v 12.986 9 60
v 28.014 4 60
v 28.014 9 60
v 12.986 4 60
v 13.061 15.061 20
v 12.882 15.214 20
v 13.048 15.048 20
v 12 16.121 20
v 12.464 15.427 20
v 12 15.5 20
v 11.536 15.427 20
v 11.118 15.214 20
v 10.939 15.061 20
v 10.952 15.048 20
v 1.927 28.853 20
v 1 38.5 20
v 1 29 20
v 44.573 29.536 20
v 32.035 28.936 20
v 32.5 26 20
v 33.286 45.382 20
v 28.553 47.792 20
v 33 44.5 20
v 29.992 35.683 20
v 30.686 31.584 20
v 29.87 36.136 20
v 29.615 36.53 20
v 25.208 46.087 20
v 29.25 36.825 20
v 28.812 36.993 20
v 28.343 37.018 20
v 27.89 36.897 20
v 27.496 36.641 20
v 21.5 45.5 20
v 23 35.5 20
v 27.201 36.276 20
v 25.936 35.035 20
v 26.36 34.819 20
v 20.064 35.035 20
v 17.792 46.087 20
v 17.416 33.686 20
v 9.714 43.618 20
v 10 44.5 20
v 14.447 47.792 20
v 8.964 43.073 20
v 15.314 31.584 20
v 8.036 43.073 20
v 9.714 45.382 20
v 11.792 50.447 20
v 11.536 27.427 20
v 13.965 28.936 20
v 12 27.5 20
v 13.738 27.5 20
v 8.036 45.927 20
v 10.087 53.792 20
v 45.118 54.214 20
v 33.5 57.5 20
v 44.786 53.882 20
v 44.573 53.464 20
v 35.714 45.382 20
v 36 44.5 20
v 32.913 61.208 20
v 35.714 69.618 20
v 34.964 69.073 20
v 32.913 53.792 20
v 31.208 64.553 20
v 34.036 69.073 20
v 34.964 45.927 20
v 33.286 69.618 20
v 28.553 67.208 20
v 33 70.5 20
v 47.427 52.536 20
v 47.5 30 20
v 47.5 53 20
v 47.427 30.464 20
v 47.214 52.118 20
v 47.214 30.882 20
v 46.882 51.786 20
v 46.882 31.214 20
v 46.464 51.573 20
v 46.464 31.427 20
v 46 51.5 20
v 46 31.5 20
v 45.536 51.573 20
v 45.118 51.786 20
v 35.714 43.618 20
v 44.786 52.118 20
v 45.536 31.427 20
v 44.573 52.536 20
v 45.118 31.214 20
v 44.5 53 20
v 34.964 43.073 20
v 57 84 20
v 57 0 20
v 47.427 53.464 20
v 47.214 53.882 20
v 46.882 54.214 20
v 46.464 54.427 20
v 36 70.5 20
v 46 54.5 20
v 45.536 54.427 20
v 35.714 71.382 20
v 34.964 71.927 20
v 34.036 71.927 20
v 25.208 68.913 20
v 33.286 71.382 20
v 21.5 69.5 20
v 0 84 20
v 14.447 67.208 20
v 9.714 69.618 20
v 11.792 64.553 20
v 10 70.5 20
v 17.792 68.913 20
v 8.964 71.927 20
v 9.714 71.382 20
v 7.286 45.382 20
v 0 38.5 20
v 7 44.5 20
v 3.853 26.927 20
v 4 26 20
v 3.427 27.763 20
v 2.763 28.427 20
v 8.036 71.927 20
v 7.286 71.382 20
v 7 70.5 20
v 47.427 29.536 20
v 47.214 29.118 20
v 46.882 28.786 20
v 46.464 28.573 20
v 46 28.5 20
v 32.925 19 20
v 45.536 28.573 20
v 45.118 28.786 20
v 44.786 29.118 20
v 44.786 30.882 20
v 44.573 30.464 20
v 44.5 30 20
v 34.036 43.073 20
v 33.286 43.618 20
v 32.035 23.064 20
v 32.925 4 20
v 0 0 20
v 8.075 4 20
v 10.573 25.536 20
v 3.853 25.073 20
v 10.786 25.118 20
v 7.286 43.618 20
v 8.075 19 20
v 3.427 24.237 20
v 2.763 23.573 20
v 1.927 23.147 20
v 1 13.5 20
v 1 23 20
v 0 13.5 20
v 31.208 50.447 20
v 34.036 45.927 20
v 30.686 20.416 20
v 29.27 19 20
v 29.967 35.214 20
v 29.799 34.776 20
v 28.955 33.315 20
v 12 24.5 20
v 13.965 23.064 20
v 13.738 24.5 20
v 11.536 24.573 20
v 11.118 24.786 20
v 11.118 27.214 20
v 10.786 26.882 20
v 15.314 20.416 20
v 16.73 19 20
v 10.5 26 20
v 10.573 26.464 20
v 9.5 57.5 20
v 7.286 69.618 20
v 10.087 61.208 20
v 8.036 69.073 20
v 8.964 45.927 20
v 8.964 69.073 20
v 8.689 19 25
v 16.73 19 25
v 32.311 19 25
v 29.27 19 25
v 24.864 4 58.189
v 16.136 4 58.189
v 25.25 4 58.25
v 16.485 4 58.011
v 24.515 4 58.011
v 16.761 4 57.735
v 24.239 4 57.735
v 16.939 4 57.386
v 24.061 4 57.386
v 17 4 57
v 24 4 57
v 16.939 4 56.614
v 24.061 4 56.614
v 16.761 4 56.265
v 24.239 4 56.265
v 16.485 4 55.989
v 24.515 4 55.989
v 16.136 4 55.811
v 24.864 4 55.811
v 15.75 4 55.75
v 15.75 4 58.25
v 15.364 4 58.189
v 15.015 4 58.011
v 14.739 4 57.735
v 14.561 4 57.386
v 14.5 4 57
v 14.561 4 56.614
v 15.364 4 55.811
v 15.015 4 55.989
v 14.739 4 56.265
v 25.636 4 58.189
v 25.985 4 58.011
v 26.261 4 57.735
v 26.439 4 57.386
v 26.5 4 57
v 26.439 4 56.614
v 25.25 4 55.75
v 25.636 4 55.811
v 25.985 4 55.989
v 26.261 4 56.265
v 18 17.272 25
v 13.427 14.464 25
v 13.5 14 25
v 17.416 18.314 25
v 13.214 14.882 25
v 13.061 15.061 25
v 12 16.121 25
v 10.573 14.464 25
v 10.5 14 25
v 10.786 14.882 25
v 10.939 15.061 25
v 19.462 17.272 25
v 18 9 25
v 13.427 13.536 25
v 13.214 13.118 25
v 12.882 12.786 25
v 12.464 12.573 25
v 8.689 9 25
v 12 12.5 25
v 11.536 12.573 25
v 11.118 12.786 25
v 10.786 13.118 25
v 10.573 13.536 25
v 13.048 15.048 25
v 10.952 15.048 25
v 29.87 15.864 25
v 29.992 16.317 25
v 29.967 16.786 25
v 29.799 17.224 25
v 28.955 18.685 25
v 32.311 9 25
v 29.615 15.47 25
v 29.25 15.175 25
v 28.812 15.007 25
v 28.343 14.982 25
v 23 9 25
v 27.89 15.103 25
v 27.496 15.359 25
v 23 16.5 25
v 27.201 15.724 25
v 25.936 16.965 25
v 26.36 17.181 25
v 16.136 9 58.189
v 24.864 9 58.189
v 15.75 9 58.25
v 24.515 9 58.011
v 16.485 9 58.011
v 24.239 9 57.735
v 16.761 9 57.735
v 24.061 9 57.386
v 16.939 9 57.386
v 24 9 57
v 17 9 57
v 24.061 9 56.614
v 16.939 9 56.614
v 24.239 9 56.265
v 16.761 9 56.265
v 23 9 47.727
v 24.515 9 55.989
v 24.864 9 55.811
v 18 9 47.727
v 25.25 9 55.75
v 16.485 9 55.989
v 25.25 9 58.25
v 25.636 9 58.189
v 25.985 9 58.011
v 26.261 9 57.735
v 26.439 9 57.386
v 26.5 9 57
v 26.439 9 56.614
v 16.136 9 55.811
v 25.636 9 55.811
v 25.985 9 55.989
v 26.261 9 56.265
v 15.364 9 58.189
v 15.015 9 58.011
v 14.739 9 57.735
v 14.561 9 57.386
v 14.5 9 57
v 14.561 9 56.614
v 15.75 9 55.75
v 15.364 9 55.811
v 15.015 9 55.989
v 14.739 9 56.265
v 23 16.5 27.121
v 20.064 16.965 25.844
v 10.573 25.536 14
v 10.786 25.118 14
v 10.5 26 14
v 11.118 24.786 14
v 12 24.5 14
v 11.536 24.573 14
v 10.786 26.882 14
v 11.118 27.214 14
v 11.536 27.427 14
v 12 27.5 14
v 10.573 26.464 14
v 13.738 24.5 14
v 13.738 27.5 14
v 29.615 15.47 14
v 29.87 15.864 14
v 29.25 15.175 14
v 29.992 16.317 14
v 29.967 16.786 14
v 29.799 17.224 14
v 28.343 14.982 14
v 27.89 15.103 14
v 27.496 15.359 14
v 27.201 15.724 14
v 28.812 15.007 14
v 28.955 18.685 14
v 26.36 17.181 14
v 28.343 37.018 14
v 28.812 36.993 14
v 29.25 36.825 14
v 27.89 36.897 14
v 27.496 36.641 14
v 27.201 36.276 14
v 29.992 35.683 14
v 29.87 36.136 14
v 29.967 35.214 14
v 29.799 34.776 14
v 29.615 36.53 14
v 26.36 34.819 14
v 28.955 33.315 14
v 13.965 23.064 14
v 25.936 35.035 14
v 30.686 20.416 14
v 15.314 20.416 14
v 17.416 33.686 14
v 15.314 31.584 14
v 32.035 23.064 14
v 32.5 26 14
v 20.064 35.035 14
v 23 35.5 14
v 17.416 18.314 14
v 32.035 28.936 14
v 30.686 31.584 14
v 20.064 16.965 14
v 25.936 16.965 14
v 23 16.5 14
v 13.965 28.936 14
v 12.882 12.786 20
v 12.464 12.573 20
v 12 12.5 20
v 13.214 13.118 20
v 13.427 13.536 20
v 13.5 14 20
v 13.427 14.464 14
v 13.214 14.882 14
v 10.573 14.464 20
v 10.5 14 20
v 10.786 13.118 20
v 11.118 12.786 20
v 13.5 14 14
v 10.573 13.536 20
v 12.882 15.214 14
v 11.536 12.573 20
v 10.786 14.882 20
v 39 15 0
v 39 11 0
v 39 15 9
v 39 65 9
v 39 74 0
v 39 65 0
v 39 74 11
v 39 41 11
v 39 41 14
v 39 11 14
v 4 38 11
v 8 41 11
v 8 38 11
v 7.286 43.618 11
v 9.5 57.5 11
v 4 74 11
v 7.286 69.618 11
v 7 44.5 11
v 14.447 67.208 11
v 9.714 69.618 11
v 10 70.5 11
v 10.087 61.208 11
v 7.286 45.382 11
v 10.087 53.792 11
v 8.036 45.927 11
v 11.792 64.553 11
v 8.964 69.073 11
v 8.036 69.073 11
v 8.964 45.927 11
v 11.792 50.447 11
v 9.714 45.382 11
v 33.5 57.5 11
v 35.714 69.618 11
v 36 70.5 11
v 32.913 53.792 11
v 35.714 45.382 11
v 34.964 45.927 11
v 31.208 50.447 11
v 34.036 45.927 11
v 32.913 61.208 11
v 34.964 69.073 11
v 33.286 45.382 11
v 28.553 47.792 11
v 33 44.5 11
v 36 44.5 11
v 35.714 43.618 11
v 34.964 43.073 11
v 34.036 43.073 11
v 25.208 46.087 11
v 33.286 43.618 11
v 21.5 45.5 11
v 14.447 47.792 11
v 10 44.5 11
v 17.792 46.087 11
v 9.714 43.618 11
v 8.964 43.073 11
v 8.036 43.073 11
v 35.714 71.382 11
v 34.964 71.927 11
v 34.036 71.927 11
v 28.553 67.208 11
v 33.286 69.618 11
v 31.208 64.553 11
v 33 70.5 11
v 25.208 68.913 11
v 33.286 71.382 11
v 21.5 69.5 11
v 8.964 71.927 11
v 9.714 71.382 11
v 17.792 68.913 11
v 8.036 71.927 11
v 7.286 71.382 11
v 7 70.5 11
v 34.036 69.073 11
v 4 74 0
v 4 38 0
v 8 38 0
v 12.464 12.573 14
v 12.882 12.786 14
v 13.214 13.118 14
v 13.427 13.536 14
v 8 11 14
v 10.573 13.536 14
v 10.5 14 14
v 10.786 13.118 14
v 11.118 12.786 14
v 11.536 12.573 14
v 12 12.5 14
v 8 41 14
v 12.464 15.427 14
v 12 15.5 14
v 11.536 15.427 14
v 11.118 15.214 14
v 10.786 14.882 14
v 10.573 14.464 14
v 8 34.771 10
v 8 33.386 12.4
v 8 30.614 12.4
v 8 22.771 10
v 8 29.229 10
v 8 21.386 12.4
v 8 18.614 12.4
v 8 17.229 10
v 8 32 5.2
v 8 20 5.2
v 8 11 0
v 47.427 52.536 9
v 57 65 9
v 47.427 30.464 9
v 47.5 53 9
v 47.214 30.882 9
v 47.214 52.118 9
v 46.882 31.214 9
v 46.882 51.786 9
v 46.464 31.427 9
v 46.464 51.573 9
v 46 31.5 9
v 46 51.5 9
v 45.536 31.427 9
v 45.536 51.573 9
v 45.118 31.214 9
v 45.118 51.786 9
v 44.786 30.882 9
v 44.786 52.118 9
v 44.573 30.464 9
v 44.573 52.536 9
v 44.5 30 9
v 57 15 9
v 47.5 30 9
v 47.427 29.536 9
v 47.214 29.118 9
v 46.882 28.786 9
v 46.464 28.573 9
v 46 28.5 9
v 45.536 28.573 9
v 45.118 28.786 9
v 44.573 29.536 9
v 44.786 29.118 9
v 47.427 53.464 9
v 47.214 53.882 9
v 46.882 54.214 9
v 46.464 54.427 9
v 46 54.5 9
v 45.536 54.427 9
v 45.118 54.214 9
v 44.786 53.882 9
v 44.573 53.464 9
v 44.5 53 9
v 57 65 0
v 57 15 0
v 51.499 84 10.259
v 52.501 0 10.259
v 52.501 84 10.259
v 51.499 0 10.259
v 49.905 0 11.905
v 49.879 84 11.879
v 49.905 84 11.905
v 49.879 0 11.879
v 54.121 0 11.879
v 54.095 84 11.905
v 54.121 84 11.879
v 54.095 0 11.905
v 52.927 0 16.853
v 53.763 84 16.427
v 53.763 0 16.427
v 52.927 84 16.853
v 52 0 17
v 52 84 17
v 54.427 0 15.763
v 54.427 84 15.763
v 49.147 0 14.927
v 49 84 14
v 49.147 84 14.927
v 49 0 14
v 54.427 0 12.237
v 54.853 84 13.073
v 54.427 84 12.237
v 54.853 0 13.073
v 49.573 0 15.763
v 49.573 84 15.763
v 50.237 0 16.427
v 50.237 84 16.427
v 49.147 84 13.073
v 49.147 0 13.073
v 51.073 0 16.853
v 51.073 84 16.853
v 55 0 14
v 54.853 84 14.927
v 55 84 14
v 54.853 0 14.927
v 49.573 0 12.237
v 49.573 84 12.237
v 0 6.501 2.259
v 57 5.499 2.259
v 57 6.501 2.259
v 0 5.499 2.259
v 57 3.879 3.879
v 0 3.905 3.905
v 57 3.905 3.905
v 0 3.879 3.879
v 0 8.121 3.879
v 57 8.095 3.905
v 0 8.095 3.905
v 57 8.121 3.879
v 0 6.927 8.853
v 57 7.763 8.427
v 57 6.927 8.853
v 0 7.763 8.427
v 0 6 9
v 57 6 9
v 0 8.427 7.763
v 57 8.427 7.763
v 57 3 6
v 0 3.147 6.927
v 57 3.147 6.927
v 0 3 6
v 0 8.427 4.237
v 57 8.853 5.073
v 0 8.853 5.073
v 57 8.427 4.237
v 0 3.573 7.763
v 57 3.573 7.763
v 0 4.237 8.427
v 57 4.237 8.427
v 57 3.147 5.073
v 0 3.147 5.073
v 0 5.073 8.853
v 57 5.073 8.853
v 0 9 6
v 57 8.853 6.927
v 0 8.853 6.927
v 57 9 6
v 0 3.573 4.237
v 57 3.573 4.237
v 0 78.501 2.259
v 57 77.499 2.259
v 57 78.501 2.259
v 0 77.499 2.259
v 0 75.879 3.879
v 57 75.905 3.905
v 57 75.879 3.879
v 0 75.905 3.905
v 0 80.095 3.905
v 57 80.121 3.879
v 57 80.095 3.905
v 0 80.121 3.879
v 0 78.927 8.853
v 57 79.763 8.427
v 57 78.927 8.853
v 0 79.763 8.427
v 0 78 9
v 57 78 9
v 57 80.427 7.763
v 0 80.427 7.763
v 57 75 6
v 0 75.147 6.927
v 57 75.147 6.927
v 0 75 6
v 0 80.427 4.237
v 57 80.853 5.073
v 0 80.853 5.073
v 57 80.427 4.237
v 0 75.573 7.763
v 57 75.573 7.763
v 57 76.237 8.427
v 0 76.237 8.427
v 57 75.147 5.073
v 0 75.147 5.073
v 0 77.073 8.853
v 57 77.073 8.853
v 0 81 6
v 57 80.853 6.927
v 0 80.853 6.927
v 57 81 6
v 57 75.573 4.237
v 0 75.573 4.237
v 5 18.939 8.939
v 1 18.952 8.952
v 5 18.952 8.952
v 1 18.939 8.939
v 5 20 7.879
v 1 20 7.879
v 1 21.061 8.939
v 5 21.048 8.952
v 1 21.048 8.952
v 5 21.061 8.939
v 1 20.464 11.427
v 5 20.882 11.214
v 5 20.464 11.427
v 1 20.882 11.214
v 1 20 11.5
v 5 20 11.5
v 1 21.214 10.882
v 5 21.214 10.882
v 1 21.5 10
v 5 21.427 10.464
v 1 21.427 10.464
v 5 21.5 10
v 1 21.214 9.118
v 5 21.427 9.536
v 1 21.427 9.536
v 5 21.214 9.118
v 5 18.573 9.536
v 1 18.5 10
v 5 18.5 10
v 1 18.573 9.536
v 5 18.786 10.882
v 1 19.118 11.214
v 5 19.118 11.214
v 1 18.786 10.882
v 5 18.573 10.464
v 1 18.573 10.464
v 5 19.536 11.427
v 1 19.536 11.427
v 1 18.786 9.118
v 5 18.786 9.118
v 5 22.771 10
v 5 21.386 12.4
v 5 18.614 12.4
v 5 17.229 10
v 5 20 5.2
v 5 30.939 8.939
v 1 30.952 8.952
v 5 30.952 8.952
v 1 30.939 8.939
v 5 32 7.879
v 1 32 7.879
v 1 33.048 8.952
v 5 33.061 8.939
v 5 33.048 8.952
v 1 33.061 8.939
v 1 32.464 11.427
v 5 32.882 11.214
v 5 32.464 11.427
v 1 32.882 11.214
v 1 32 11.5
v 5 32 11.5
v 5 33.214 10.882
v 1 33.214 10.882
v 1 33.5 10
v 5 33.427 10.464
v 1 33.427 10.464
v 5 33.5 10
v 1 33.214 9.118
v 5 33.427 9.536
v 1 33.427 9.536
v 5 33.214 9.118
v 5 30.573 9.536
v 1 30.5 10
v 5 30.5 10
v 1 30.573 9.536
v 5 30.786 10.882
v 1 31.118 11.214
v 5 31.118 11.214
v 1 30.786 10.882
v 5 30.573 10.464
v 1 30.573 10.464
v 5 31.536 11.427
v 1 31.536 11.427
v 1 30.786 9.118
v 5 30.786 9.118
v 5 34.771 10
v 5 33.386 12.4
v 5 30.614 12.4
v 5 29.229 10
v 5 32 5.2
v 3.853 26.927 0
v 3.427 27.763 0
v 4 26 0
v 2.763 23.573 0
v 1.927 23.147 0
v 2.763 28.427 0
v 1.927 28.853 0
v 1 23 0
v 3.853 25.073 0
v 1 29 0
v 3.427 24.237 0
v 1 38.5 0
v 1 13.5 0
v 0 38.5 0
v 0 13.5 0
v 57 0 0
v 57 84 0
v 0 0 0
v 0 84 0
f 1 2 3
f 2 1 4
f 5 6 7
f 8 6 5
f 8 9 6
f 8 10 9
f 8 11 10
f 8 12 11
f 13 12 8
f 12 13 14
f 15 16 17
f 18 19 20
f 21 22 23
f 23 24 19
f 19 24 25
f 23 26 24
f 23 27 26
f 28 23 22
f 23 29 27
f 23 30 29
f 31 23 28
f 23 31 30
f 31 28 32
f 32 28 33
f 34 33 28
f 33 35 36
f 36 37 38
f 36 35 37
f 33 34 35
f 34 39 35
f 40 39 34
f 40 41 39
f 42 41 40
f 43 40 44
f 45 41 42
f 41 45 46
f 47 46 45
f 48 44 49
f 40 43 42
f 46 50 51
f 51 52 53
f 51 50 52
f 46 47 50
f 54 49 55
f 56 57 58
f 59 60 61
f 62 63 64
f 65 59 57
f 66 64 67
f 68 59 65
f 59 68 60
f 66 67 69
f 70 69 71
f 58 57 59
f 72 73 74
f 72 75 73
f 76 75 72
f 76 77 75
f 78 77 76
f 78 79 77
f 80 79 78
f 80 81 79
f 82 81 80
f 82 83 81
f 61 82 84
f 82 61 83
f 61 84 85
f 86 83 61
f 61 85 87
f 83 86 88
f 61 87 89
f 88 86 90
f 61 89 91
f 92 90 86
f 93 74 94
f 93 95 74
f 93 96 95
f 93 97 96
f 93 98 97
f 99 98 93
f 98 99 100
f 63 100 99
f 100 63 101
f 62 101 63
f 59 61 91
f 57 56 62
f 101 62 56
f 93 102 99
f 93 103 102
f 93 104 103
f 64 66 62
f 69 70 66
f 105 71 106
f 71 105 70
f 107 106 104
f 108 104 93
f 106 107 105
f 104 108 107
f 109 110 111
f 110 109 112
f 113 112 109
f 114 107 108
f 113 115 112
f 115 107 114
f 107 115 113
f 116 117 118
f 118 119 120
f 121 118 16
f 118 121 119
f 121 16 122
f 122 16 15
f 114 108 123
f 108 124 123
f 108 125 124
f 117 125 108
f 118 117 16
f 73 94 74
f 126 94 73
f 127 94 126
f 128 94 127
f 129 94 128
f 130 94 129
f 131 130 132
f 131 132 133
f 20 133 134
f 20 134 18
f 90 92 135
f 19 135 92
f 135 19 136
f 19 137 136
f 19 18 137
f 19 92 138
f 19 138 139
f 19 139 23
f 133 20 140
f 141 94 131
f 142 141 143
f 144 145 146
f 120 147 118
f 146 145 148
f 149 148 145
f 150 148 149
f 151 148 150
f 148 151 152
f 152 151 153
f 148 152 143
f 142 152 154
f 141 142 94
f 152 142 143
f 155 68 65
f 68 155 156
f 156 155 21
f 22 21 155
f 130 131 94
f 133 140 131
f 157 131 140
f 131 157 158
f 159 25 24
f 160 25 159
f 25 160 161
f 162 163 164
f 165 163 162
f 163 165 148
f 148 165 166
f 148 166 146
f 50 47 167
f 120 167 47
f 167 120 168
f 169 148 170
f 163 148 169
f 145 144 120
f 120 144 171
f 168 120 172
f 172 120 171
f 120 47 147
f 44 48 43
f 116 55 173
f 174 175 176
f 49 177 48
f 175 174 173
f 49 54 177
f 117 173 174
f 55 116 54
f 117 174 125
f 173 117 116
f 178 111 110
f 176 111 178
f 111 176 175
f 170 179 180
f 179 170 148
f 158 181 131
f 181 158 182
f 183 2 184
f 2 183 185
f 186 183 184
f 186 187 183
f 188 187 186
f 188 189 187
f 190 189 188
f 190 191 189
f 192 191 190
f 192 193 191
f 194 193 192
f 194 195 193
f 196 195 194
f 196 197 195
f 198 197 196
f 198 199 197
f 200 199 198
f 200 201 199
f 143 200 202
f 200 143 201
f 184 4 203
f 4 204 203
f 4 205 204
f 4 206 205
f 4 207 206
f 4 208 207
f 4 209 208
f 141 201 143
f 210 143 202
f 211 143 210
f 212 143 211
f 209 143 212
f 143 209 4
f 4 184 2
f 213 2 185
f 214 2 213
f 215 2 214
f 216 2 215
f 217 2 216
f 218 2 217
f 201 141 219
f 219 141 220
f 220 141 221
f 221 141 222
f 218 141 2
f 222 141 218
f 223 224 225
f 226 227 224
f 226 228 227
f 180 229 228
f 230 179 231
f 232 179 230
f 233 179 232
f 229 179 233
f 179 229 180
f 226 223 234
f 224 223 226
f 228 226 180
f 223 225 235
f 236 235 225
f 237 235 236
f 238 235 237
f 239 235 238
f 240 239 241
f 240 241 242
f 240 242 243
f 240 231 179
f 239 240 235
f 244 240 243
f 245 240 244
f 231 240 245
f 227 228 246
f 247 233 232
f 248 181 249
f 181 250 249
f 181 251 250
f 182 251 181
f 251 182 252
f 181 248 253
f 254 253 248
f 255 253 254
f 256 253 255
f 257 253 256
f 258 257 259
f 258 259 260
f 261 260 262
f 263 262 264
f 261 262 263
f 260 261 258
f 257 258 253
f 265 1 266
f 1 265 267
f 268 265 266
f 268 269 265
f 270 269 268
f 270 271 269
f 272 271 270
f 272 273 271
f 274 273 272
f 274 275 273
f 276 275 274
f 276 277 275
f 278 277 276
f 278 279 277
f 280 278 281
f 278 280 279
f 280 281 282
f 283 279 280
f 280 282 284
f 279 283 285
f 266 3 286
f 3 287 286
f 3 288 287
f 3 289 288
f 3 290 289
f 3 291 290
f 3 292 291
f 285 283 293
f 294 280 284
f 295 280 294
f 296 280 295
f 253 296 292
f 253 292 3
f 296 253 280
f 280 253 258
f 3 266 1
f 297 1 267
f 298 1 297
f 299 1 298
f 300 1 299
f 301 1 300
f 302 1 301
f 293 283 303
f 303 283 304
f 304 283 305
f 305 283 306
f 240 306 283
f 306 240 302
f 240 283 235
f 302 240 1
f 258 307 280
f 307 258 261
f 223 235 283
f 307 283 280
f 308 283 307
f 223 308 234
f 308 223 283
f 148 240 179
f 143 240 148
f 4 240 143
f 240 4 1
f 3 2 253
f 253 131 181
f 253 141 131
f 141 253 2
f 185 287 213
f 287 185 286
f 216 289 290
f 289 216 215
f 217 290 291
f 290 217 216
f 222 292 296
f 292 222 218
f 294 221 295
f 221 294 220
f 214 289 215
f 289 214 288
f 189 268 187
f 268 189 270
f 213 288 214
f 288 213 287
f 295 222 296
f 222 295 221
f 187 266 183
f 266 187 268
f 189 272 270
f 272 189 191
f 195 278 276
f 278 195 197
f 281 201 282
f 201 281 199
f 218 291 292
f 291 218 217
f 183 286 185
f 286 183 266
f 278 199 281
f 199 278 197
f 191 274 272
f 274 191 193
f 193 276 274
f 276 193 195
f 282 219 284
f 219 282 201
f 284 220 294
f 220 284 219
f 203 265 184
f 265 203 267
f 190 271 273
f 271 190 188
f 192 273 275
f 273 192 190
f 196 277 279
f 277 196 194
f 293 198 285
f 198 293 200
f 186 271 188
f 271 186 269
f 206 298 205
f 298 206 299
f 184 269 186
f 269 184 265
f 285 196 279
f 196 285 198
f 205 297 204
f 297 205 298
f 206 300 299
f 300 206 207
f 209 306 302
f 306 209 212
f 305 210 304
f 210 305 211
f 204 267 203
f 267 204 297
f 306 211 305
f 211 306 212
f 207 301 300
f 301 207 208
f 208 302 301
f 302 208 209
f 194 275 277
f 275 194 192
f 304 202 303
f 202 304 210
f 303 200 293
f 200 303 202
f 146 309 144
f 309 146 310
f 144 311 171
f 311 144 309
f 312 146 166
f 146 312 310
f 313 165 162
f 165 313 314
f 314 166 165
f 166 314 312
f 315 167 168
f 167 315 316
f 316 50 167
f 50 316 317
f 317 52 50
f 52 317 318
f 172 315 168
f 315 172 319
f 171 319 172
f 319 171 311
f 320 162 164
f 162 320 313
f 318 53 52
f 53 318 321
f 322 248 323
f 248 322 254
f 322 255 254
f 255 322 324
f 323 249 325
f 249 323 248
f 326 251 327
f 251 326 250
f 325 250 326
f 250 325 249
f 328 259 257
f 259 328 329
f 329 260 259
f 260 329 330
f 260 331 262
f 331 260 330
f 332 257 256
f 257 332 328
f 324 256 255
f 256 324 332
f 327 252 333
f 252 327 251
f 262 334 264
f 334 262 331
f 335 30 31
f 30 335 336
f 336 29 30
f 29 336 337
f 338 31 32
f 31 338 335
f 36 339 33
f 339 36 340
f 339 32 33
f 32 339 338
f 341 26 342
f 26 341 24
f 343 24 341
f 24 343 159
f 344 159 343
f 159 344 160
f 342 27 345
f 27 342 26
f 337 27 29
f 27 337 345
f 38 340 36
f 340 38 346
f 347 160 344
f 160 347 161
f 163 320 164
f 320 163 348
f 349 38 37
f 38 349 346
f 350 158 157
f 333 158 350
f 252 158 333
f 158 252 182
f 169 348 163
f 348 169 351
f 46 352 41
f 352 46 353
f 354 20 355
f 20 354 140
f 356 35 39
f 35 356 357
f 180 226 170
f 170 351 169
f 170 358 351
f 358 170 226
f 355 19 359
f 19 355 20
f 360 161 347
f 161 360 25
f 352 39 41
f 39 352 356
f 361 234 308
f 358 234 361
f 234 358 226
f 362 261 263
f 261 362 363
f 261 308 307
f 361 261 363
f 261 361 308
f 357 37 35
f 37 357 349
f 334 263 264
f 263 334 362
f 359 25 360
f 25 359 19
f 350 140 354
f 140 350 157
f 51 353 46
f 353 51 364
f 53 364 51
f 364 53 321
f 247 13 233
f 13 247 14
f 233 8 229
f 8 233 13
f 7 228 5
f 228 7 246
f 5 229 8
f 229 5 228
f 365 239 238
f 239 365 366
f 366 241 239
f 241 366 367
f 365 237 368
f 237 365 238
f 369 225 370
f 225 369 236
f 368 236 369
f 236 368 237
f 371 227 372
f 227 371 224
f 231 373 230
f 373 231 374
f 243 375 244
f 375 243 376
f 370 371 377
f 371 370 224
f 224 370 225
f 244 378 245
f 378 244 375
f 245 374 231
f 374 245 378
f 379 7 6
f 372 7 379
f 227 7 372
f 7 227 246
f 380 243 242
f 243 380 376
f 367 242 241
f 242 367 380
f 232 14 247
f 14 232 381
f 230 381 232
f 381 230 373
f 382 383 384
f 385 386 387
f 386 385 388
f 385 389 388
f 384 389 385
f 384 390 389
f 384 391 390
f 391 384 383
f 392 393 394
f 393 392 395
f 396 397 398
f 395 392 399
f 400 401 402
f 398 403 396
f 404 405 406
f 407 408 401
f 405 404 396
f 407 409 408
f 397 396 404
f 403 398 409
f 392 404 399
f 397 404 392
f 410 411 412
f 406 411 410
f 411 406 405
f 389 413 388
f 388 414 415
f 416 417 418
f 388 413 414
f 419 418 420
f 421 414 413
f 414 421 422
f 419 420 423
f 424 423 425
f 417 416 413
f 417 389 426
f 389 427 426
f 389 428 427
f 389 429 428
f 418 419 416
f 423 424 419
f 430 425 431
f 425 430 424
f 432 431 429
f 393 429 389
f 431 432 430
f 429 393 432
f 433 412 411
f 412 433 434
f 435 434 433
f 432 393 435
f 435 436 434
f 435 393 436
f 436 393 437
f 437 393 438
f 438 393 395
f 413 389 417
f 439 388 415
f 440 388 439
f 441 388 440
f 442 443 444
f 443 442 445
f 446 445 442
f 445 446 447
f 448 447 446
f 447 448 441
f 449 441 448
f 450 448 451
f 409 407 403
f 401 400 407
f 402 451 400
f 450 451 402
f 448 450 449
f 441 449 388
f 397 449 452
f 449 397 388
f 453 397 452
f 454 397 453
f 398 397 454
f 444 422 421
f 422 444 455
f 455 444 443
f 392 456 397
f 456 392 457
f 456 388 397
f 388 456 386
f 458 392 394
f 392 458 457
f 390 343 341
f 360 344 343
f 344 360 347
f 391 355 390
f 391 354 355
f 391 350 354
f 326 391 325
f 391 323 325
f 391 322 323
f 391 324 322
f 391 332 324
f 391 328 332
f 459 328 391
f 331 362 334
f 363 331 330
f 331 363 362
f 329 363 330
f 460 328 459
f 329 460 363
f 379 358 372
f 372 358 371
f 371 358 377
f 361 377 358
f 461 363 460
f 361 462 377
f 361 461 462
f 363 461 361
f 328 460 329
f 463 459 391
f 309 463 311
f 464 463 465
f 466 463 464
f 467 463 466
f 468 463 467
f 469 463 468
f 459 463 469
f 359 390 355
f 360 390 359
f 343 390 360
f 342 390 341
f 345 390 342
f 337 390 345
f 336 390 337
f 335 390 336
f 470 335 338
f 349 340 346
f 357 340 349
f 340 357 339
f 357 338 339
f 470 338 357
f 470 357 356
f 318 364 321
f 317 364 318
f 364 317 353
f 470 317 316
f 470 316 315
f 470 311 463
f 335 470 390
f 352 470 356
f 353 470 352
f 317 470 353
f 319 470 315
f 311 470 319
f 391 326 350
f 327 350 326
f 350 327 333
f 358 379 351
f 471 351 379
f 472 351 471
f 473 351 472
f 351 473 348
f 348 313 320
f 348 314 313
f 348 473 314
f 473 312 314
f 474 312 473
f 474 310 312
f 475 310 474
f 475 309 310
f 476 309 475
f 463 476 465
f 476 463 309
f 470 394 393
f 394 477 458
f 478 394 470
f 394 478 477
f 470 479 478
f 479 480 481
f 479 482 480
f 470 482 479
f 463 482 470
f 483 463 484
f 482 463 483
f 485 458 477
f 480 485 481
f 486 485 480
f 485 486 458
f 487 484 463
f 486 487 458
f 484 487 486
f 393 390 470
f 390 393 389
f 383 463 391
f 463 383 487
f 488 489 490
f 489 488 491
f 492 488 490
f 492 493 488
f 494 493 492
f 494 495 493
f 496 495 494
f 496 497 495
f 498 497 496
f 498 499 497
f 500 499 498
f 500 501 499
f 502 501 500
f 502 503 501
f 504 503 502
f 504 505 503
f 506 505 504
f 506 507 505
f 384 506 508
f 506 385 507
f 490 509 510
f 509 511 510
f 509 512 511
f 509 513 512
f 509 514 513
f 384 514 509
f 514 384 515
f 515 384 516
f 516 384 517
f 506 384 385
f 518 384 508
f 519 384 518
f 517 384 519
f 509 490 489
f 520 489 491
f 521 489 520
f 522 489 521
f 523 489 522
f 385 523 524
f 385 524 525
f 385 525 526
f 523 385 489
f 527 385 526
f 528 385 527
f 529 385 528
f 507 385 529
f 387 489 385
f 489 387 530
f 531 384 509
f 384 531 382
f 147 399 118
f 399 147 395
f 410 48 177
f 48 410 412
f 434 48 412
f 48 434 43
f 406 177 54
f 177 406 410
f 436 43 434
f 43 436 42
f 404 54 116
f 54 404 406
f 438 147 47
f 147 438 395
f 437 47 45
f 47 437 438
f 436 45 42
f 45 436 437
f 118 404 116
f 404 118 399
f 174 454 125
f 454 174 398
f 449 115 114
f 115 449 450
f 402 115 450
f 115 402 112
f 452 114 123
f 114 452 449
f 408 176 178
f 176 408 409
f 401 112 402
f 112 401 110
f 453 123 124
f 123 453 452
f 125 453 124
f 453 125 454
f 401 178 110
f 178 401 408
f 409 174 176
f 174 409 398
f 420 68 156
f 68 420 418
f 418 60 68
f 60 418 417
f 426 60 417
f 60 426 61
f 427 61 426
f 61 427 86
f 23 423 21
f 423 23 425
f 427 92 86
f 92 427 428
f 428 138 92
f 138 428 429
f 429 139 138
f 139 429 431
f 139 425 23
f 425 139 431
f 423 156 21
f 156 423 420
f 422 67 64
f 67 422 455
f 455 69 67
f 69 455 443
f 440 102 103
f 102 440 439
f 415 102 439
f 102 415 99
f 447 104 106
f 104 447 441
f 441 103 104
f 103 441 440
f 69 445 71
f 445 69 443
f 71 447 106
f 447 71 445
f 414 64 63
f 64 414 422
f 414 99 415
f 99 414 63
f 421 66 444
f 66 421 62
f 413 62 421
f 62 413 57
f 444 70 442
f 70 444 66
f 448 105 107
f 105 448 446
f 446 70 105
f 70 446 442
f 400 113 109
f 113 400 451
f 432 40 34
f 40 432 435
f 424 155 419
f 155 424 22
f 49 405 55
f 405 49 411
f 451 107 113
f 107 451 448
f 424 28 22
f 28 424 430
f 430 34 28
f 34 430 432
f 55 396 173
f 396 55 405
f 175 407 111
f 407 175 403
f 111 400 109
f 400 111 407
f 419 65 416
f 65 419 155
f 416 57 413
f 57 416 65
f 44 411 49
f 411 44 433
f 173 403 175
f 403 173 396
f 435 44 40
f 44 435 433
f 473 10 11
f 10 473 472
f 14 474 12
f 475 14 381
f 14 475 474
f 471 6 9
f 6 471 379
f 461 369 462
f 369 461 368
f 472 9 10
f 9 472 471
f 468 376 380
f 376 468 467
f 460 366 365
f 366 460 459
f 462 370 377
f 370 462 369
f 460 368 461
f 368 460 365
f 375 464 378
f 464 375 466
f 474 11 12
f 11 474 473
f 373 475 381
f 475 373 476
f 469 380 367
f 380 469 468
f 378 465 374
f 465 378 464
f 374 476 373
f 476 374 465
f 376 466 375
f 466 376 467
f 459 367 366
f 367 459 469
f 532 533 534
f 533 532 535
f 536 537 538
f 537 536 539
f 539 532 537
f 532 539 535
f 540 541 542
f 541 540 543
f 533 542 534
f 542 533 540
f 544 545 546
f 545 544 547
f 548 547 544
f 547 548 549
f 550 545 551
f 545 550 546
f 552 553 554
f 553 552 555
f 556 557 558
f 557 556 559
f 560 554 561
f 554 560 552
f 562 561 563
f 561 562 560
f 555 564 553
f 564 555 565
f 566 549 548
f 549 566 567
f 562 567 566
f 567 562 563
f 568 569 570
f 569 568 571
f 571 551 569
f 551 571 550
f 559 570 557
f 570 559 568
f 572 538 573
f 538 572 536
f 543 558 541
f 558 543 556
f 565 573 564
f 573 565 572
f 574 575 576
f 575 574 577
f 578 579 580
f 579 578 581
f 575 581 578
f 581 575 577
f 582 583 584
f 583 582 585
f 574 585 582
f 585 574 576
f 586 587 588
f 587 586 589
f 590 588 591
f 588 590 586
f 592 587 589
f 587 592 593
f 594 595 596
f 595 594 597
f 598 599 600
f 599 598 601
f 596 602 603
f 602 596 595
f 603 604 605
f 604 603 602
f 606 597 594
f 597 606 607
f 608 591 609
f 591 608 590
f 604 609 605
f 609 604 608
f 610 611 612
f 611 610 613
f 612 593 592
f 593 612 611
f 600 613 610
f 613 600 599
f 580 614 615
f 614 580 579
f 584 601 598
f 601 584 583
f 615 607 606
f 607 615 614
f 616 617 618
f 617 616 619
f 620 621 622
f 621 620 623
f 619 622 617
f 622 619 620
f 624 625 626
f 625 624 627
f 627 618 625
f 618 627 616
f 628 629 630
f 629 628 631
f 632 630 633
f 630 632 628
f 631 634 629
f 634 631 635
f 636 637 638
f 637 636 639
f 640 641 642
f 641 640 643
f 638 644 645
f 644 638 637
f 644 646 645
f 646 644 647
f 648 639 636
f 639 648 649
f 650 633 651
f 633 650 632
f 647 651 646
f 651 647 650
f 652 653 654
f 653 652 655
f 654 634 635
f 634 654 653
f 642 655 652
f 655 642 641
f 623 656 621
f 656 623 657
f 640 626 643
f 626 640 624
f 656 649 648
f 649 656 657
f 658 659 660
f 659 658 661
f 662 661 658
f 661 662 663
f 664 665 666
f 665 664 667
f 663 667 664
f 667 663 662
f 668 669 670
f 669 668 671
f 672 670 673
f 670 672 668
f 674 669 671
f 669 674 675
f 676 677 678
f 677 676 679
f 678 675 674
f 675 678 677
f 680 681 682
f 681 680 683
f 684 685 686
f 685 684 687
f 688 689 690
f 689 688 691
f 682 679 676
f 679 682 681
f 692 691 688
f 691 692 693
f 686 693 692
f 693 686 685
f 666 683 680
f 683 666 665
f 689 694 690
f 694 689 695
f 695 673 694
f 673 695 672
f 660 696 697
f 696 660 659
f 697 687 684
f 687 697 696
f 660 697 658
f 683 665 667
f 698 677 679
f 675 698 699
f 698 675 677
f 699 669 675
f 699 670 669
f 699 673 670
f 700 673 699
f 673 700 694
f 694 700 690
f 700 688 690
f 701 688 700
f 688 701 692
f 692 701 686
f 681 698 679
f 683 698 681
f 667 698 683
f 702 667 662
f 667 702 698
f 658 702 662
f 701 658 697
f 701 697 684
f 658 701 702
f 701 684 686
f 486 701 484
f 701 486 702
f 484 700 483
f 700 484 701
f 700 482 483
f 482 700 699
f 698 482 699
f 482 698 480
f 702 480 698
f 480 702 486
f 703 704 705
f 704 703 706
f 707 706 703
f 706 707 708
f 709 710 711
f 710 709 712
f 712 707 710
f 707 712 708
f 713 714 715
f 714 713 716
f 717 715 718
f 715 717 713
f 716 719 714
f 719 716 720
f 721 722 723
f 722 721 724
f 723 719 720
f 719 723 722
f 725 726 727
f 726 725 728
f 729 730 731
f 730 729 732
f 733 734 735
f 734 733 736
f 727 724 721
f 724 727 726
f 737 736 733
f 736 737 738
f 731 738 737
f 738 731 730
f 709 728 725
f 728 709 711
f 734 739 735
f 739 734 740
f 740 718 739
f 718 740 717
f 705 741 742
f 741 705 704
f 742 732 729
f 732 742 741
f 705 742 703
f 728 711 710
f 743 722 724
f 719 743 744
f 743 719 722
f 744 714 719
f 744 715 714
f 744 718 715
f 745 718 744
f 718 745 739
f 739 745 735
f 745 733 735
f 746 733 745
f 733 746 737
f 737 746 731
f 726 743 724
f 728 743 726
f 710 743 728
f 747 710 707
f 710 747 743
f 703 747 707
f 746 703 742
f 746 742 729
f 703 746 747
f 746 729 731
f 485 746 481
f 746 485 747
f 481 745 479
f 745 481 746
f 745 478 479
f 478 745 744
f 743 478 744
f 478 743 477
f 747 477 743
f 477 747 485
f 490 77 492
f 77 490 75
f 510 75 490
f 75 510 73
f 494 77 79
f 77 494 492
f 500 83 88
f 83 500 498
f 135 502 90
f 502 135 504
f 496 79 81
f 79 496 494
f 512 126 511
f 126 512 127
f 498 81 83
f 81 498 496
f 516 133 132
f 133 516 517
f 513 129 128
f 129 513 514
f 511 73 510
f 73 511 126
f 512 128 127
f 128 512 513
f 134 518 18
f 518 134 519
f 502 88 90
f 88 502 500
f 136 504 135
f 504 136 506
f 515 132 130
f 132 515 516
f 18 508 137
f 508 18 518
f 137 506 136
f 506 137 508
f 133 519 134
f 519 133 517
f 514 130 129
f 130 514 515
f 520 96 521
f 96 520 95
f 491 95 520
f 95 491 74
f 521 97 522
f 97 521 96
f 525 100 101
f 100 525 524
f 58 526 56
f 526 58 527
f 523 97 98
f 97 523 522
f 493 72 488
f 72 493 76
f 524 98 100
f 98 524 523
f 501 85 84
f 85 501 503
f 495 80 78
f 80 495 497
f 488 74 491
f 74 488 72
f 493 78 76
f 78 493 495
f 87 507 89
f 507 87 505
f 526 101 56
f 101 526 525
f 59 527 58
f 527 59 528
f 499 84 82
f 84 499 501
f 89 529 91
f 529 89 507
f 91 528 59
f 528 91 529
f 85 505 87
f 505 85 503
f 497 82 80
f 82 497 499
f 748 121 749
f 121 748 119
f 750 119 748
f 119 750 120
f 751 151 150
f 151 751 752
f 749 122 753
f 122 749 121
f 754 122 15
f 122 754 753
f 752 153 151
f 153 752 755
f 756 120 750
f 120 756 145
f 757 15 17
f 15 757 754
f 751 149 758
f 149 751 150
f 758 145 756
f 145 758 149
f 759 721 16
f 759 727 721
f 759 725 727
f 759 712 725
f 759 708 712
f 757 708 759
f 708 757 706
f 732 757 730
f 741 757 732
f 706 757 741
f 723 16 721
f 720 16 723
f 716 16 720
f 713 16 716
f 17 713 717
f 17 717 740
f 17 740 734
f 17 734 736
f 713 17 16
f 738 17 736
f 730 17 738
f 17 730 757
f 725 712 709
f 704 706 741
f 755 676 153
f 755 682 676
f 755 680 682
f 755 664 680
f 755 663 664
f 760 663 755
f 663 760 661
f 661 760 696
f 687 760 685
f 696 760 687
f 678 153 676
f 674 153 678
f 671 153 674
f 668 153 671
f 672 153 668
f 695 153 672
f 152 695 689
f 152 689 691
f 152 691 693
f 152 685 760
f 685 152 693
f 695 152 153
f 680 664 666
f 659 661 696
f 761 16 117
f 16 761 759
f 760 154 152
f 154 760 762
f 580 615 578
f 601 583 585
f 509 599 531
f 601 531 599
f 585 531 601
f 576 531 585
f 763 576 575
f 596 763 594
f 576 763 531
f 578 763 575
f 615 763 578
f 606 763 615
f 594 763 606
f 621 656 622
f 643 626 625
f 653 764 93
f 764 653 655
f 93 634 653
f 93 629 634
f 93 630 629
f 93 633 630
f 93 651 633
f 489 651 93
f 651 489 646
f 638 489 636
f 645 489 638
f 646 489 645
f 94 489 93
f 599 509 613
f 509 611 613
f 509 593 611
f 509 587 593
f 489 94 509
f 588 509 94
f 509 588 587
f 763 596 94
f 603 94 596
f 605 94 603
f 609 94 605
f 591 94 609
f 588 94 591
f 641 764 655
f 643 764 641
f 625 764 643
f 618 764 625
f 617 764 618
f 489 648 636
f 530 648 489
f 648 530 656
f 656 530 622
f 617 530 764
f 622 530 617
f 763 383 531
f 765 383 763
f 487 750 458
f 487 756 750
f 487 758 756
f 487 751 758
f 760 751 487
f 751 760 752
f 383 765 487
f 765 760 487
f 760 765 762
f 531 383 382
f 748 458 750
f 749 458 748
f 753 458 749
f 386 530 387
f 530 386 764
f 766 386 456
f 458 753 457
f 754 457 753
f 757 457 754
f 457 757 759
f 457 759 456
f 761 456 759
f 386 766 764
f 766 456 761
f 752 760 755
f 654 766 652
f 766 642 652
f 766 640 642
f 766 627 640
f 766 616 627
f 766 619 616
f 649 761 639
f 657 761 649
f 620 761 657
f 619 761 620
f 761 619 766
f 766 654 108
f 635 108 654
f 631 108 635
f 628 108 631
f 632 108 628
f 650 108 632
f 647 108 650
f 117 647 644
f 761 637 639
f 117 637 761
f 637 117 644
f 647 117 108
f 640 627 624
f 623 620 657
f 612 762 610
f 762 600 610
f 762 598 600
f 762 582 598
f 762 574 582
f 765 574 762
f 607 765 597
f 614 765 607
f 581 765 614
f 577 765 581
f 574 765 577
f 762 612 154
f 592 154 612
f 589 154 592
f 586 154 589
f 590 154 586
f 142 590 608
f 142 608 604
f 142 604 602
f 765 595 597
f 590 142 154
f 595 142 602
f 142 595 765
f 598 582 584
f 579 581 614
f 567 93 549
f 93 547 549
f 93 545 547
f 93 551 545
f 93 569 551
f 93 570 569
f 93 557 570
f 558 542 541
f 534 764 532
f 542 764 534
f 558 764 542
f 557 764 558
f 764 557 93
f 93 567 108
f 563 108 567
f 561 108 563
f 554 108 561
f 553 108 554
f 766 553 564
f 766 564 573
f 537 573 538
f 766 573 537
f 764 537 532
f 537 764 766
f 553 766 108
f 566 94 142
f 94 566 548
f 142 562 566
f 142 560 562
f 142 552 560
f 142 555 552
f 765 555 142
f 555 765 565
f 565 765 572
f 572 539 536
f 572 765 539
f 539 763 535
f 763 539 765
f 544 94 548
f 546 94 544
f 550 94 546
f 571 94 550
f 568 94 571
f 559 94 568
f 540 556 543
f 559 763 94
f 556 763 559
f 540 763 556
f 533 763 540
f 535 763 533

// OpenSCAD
// file: library.scad
include <parameters.scad>;


// inner and outer product.  Why aren't these standard?!!!?

function ip(v1 = [0,0,0], v2 = [0,0,0]) = v1.x*v2.x + v1.y*v2.y + v1.z*v2.z;

function op(v1 = [0,0,0], v2 = [0,0,0]) = [v1.y*v2.z - v1.z*v2.y, v1.z*v2.x - v1.x*v2.z, v1.x*v2.y - v1.y*v2.x];


/*
  This makes an angled strut in space between two points.  It is parallel to one of the
  coordinate planes, which means that one coordinate of the two endpoints must be the same.


module strut(p1=[0,0,0], p2=[0,0,1], deep = 5, wide = 10)
{
	if(abs(p1.x - p2.x) < 0.00001)
	{

	} else if(abs(p1.y - p2.y) < 0.00001)
	{

	} else
	{

		cube([sqrt(

	}
}
*/

/*
  This gives either a NEMA 14 stepper motor or its mounting holes.

  If body is true, you get the motor.  If it is false you get the screw holes and central
  hole needed to mount the motor.  If counterbore is positive and you are generating the mounting holes
  then the screw holes will get fat to accomodate a cap-screw head counterbore mm away from the face 
  of the motor.  For no counterbores, set counterbore negative.

*/

module nema14(body = true, counterbore = -1)
{
	color([1,0.4,0.4,1])
	union()
	{
		if(body)
		{
			translate([0, 0, nema14_shaft_length/2 - nema14_shaft_projection - nema14_hub_depth])
				cylinder(r = nema14_shaft/2, h = nema14_shaft_length, center = true, $fn=20);
			translate([0, 0, -nema14_hub_depth])
				cylinder(r = nema14_hub/2, h = nema14_hub_depth*2, center = true, $fn=20);
	
			translate([0, 0, nema14_length/2])
				cube([nema14_square,nema14_square,nema14_length], center = true);
		} else
			translate([0, 0, -20])
				cylinder(r = nema14_hub/2 + 1, h = 50, center = true, $fn=20);

		if(!body)
		{
			union()
			{
				for ( x = [0:1] ) 
				for ( y = [0:1] )
				{
					translate([(x-0.5)*nema14_screws, (y-0.5)*nema14_screws, -20])
						cylinder(r = screwsize/2, h = 50, center = true, $fn=10);
					if(counterbore >= 0)
						translate([(x-0.5)*nema14_screws, (y-0.5)*nema14_screws, -25-counterbore])
							cylinder(r = screwsize, h = 50, center = true, $fn=10);
				}
			}
		}
	}


}


// Pentagon nut that matches a hexagon...

module pentanut(height=40)
{
	rotate([0,0,60])
	intersection()
	{
		translate([-nutsize,-nutsize*5,-20])
			cube([nutsize*10, nutsize*10,height]);
		rotate([0,0,60])
			translate([-nutsize,-nutsize*5,-20])
				cube([nutsize*10, nutsize*10,height]);
		rotate([0,0,120])
			translate([-nutsize,-nutsize*5,-20])
				cube([nutsize*10, nutsize*10,height]);
		rotate([0,0,180])
			translate([-nutsize,-nutsize*5,-20])
				cube([nutsize*10, nutsize*10,height]);
		rotate([0,0,240])
			translate([-nutsize,-nutsize*5,-20])
				cube([nutsize*10, nutsize*10,height]);
	}
}


// Make a RepRap teardrop with its axis along Z
// If truncated is true, chop the apex; if not, come to a point

// I stole this function from Erik...


module teardrop(r=1.5, h=20, truncateMM=0.5)
{
	union()
	{
		if(truncateMM > 0)
		{
			intersection()
			{
				translate([truncateMM,0,h/2]) 
					scale([1,1,h])
						cube([r*2.8275,r*2,1],center=true);
				scale([1,1,h]) 
						rotate([0,0,3*45])
							cube([r,r,1]);
			}
		} else
		{
			scale([1,1,h])
				rotate([0,0,3*45])
					cube([r,r,1]);
		}
		cylinder(r=r, h = h, $fn=20);
	}
}


// Make a ball-bearing holder cutout

module bearing_holder(radius = 6.5)
{
	union()
	{
		cylinder (h = radius*20, r = radius, center = true, $fn = 20);
		for(i=[0:2])
		{
			rotate([0,0,120*i])
				translate([radius+screwsize/2, 0, 0])
					union()
					{
						cylinder (h = radius*20, r = screwsize/2, center = true, $fn = 20);
						translate([-screwsize, 0, 0])
							cube([2*screwsize, screwsize, radius*20], center = true);
					}
		}
	}
}

// Make a cuboid with a 45 degree top for vertical slots etc

module cen_hat(size)
{
	translate([0, 0, size.x/sqrt(2)])
		union()
		{
			rotate([0, 45, 0])
				cube([size.x, size.y, 5*max(size.x, max(size.y, size.z))], center=true);
			rotate([0, -45, 0])
				cube([size.x, size.y, 5*max(size.x, max(size.y, size.z))], center=true);
		}
}

module hat_cube(size = [1,1,1], center = false)
{
	difference()
	{
		cube(size, center);
		if(center)
			translate([0, 0, size.z/2])
				cen_hat(size);
		else
			translate([size.x/2, size.y/2, size.z])
				cen_hat(size);
	}
}



module rod(length, threaded) if (threaded && renderrodthreads) {
	linear_extrude(height = length, center = true, convexity = 10, twist = -360 * length / rodpitch, $fn = fn)
		translate([rodsize * 0.1 / 2, 0, 0])
			circle(r = rodsize * 0.9 / 2, $fn = fn);
} else cylinder(h = length, r = rodsize / 2, center = true, $fn = fn);


module rodnut(position, washer) render() translate([0, 0, position]) {
	intersection() {
		scale([1, 1, 0.5]) sphere(r = 1.05 * rodsize, center = true);
		difference() {
			cylinder (h = rodnutsize, r = rodnutdiameter / 2, center = true, $fn = 6);
			rod(rodnutsize + 0.1);
		}
	}
	if (washer == 1 || washer == 4) rodwasher(((position > 0) ? -1 : 1) * (rodnutsize + rodwashersize) / 2);
	if (washer == 2 || washer == 4) rodwasher(((position > 0) ? 1 : -1) * (rodnutsize + rodwashersize) / 2);
}


module rodwasher(position) render() translate ([0, 0, position]) difference() {
	cylinder(r = rodwasherdiameter / 2, h = rodwashersize, center = true, $fn = fn);
	rod(rodwashersize + 0.1);
}


module screw(length, nutpos, washer, bearingpos = -1) union(){
	translate([0, 0, -length / 2]) if (renderscrewthreads) {
		linear_extrude(height = length, center = true, convexity = 10, twist = -360 * length / screwpitch, $fn = fn)
			translate([screwsize * 0.1 / 2, 0, 0])
				circle(r = screwsize * 0.9 / 2, $fn = fn);
	} else cylinder(h = length, r = screwsize / 2, center = true, $fn = fn);
	render() difference() {
		translate([0, 0, screwsize / 2]) cylinder(h = screwsize, r = screwsize, center = true, $fn = fn);
		translate([0, 0, screwsize]) cylinder(h = screwsize, r = screwsize / 2, center = true, $fn = 6);
	}
	if (washer > 0 && nutpos > 0) {
		washer(nutpos);
		nut(nutpos + washersize);
	} else if (nutpos > 0) nut(nutpos);
	if (bearingpos >= 0) bearing(bearingpos);
}


module bearing(position) render() translate([0, 0, -position - bearingwidth / 2]) union() {
	difference() {
		cylinder(h = bearingwidth, r = bearingsize / 2, center = true, $fn = fn);
		cylinder(h = bearingwidth * 2, r = bearingsize / 2 - 1, center = true, $fn = fn);
	}
	difference() {
		cylinder(h = bearingwidth - 0.5, r = bearingsize / 2 - 0.5, center = true, $fn = fn);
		cylinder(h = bearingwidth * 2, r = screwsize / 2 + 0.5, center = true, $fn = fn);
	}
	difference() {
		cylinder(h = bearingwidth, r = screwsize / 2 + 1, center = true, $fn = fn);
		cylinder(h = bearingwidth + 0.1, r = screwsize / 2, center = true, $fn = fn);
	}
}


module nut(position, washer) render() translate([0, 0, -position - nutsize / 2]) {
	intersection() {
		scale([1, 1, 0.5]) sphere(r = 1.05 * screwsize, center = true);
		difference() {
			cylinder (h = nutsize, r = nutdiameter / 2, center = true, $fn = 6);
			cylinder(r = screwsize / 2, h = nutsize + 0.1, center = true, $fn = fn);
		}
	}
	if (washer > 0) washer(0);
}


module washer(position) render() translate ([0, 0, -position - washersize / 2]) difference() {
	cylinder(r = washerdiameter / 2, h = washersize, center = true, $fn = fn);
	cylinder(r = screwsize / 2, h = washersize + 0.1, center = true, $fn = fn);
}


//rod(20);
//translate([rodsize * 2.5, 0, 0]) rod(20, true);
//translate([rodsize * 5, 0, 0]) screw(10, true);
//translate([rodsize * 7.5, 0, 0]) bearing();
//translate([rodsize * 10, 0, 0]) rodnut();
//translate([rodsize * 12.5, 0, 0]) rodwasher();
//translate([rodsize * 15, 0, 0]) nut();
//translate([rodsize * 17.5, 0, 0]) washer();

//hat_cube(size=[2,40,2], center=false);

//bearing_holder();

//teardrop();

//pentanut();

//nema14(body = true, counterbore = -1);
// file: parameters.scad
// Parameters file for RepRap Huxley

pi=3.14159265;

// The relative location in your file system where the .dxf files are
// DXFs are for quick development.  They should be replaced by parameterised CSG in dure course.

fileroot="DXF-files/";

rodsize = 6;	//threaded/smooth rod diameter in mm
xaxis = 182.5;	//width of base in mm
yaxis = 266.5;	//length of base in mm


screwsize = 3;	//bearing bore/screw diameter in mm
bearingsize = 10;	//outer diameter of bearings in mm
bearingwidth = 4;	//width of bearings in mm


rodpitch = rodsize / 6;
rodnutsize = 0.8 * rodsize;
rodnutdiameter = 1.9 * rodsize;
rodwashersize = 0.2 * rodsize;
rodwasherdiameter = 2 * rodsize;
screwpitch = screwsize / 6;
nutsize = 0.8 * screwsize;
nutdiameter = 1.9 * screwsize;
washersize = 0.2 * screwsize;
washerdiameter = 2 * screwsize;
partthick = 2 * rodsize;
vertexrodspace = 2 * rodsize;


c = [0.3, 0.3, 0.3];
rodendoffset = rodnutsize + rodwashersize * 2 + partthick / 2;
vertexoffset = vertexrodspace + rodendoffset;


renderrodthreads = false;
renderscrewthreads = false;
fn = 36;

// The gap between the joining rods at a vertex

vertex_radius=sqrt(rodsize*rodsize + vertexoffset*vertexoffset);
vertex_ang = atan(vertexoffset/rodsize)-30;
vertex_gap = 2*vertex_radius*cos(vertex_ang);

// Nema 14 dimensions - these are absolute

nema14_square=35.3;
nema14_screws=26;
nema14_hub=22;
nema14_hub_depth=2;
nema14_length=36;
nema14_shaft=5;
nema14_shaft_length=66;
nema14_shaft_projection=19;

// Limit switch parameters

limit_switch_hole_diameter=2.5;
limit_switch_centres=9.5;

// The RepRap slide bearings

bearing_mount_centres=18;
bearing_width=7;

// X axis parameters - many should be relative

x_bar_gap=30;
motor_center_y = 26;
bar_clamp_x=5;
bar_clamp_y=8;
bar_clamp_x_gap=23;
bearing_y=50;
bearing_x=bar_clamp_x_gap + 10;
hole_land=4;
thickness=5;
bearing_low_z = 8;
bearing_z_gap = 25;
bearing_plate_width = bearing_mount_centres+2*hole_land + 10;
bearing_plate_overlap=0.5;
bearing_plate_support=10;
// main file
include <parameters.scad>;
use <library.scad>;

zax= 57;
zay = 84;
zaz=20;

//import_stl("../z-leadscrew-base-motor_2.stl", convexity = 7);

module bearing_and_mount_screw(teardrop=false)
{

				translate([23,26,0])
					rotate([0,0,180])
						bearing_holder(radius=9.5);

				translate([12,14,0])
					if(teardrop)
						rotate([0,0,-90])
							teardrop(r=screwsize/2,h=zay,truncateMM=-1);
					else
						cylinder(r=screwsize/2,h=zay,center=true,$fn=20);
}

module z_axis_motor_base()
{
		difference()
		{
			// Starting block

			cube([zax,zay,zaz]);

			// Holes in it - colour them so we can distinguish them

			color([0.4,0.4,1,1])
			{

// Body cavity

				translate([0,0,-1])
				{
					translate([4,38,-3])
						cube([35,36,15]);
					translate([8,11,0])
						cube([31,30,15]);
					translate([25,15,-5])
						cube([40,50,15]);
				}
				
// Motor holes

				translate([21.5,57.5,20])
					nema14(body=false, counterbore=-1);


				bearing_and_mount_screw(teardrop=false);
				

				
// Vertical M3 screw holes


				translate([46,30,0])
					cylinder(r=screwsize/2,h=zay,center=true,$fn=20);
				translate([46,53,0])
					cylinder(r=screwsize/2,h=zay,center=true,$fn=20); 

// The Z rod notch

				translate([1,26,0])
					cylinder(r=rodsize/2,h=zay,center=true,$fn=20); 
				
// The M6 rod in the triangle frame

				translate([52,-10,14])
					rotate([0,-90,0])
						rotate([-90,0,0])
							teardrop(r=rodsize/2,h=zay*2,truncateMM=0.5);
		
// The M6 strengthening rods that run across
		
				translate([zax+10,6,6])
					rotate([0,-90,0])
						teardrop(r=rodsize/2,h=zay*2,truncateMM=0.5);
				
				translate([zax+10,78,6])
					rotate([0,-90,0])
						teardrop(r=rodsize/2,h=zay*2,truncateMM=0.5);
				
//  Z-rod clamp M3 holes

				translate([20,20,10])
					rotate([0,-90,0])
					{
						teardrop(r=screwsize/2,h=zay*2,truncateMM=0);
						translate([0,0,25])
						pentanut(10);
					}
				
				translate([20,32,10])
					rotate([0,-90,0])
					{
						teardrop(r=screwsize/2,h=zay*2,truncateMM=0);
						translate([0,0,25])
						pentanut(10);
					}
				
// Z clamp notch

				translate([0,26,10])
					cube([2,25,40], center=true);
			}
		}
}


module z_limit_switch_holder()
{
	difference()
	{
		translate([8,4,zaz])
		{
			difference()
			{
				union()
				{
					difference()
					{
						cube([25,15,40]);
						translate([-5,5,5])
							cube([30,15,40]);
					}
					translate([10,4,4])
						difference()
						{
							cube([5,10,25]);
							translate([-1,10,-1])
								rotate([20,0,0])
									cube([10,10,50]);
						}
				}

				translate([-10, -5, 0])
					rotate([0,7,0])
						cube([20,100,100],center=true);
				translate([35, -5, 0])
					rotate([0,-7,0])
						cube([20,100,100],center=true);

				translate([12.5+limit_switch_centres/2,0,37])
					rotate([90,0,0])
						cylinder(r=limit_switch_hole_diameter/2,h=zay,center=true,$fn=20);
				translate([12.5-limit_switch_centres/2,0,37])
					rotate([90,0,0])
						cylinder(r=limit_switch_hole_diameter/2,h=zay,center=true,$fn=20);
			}
		}
		bearing_and_mount_screw(teardrop=true);
	}
}

z_limit_switch_holder();
z_axis_motor_base();
